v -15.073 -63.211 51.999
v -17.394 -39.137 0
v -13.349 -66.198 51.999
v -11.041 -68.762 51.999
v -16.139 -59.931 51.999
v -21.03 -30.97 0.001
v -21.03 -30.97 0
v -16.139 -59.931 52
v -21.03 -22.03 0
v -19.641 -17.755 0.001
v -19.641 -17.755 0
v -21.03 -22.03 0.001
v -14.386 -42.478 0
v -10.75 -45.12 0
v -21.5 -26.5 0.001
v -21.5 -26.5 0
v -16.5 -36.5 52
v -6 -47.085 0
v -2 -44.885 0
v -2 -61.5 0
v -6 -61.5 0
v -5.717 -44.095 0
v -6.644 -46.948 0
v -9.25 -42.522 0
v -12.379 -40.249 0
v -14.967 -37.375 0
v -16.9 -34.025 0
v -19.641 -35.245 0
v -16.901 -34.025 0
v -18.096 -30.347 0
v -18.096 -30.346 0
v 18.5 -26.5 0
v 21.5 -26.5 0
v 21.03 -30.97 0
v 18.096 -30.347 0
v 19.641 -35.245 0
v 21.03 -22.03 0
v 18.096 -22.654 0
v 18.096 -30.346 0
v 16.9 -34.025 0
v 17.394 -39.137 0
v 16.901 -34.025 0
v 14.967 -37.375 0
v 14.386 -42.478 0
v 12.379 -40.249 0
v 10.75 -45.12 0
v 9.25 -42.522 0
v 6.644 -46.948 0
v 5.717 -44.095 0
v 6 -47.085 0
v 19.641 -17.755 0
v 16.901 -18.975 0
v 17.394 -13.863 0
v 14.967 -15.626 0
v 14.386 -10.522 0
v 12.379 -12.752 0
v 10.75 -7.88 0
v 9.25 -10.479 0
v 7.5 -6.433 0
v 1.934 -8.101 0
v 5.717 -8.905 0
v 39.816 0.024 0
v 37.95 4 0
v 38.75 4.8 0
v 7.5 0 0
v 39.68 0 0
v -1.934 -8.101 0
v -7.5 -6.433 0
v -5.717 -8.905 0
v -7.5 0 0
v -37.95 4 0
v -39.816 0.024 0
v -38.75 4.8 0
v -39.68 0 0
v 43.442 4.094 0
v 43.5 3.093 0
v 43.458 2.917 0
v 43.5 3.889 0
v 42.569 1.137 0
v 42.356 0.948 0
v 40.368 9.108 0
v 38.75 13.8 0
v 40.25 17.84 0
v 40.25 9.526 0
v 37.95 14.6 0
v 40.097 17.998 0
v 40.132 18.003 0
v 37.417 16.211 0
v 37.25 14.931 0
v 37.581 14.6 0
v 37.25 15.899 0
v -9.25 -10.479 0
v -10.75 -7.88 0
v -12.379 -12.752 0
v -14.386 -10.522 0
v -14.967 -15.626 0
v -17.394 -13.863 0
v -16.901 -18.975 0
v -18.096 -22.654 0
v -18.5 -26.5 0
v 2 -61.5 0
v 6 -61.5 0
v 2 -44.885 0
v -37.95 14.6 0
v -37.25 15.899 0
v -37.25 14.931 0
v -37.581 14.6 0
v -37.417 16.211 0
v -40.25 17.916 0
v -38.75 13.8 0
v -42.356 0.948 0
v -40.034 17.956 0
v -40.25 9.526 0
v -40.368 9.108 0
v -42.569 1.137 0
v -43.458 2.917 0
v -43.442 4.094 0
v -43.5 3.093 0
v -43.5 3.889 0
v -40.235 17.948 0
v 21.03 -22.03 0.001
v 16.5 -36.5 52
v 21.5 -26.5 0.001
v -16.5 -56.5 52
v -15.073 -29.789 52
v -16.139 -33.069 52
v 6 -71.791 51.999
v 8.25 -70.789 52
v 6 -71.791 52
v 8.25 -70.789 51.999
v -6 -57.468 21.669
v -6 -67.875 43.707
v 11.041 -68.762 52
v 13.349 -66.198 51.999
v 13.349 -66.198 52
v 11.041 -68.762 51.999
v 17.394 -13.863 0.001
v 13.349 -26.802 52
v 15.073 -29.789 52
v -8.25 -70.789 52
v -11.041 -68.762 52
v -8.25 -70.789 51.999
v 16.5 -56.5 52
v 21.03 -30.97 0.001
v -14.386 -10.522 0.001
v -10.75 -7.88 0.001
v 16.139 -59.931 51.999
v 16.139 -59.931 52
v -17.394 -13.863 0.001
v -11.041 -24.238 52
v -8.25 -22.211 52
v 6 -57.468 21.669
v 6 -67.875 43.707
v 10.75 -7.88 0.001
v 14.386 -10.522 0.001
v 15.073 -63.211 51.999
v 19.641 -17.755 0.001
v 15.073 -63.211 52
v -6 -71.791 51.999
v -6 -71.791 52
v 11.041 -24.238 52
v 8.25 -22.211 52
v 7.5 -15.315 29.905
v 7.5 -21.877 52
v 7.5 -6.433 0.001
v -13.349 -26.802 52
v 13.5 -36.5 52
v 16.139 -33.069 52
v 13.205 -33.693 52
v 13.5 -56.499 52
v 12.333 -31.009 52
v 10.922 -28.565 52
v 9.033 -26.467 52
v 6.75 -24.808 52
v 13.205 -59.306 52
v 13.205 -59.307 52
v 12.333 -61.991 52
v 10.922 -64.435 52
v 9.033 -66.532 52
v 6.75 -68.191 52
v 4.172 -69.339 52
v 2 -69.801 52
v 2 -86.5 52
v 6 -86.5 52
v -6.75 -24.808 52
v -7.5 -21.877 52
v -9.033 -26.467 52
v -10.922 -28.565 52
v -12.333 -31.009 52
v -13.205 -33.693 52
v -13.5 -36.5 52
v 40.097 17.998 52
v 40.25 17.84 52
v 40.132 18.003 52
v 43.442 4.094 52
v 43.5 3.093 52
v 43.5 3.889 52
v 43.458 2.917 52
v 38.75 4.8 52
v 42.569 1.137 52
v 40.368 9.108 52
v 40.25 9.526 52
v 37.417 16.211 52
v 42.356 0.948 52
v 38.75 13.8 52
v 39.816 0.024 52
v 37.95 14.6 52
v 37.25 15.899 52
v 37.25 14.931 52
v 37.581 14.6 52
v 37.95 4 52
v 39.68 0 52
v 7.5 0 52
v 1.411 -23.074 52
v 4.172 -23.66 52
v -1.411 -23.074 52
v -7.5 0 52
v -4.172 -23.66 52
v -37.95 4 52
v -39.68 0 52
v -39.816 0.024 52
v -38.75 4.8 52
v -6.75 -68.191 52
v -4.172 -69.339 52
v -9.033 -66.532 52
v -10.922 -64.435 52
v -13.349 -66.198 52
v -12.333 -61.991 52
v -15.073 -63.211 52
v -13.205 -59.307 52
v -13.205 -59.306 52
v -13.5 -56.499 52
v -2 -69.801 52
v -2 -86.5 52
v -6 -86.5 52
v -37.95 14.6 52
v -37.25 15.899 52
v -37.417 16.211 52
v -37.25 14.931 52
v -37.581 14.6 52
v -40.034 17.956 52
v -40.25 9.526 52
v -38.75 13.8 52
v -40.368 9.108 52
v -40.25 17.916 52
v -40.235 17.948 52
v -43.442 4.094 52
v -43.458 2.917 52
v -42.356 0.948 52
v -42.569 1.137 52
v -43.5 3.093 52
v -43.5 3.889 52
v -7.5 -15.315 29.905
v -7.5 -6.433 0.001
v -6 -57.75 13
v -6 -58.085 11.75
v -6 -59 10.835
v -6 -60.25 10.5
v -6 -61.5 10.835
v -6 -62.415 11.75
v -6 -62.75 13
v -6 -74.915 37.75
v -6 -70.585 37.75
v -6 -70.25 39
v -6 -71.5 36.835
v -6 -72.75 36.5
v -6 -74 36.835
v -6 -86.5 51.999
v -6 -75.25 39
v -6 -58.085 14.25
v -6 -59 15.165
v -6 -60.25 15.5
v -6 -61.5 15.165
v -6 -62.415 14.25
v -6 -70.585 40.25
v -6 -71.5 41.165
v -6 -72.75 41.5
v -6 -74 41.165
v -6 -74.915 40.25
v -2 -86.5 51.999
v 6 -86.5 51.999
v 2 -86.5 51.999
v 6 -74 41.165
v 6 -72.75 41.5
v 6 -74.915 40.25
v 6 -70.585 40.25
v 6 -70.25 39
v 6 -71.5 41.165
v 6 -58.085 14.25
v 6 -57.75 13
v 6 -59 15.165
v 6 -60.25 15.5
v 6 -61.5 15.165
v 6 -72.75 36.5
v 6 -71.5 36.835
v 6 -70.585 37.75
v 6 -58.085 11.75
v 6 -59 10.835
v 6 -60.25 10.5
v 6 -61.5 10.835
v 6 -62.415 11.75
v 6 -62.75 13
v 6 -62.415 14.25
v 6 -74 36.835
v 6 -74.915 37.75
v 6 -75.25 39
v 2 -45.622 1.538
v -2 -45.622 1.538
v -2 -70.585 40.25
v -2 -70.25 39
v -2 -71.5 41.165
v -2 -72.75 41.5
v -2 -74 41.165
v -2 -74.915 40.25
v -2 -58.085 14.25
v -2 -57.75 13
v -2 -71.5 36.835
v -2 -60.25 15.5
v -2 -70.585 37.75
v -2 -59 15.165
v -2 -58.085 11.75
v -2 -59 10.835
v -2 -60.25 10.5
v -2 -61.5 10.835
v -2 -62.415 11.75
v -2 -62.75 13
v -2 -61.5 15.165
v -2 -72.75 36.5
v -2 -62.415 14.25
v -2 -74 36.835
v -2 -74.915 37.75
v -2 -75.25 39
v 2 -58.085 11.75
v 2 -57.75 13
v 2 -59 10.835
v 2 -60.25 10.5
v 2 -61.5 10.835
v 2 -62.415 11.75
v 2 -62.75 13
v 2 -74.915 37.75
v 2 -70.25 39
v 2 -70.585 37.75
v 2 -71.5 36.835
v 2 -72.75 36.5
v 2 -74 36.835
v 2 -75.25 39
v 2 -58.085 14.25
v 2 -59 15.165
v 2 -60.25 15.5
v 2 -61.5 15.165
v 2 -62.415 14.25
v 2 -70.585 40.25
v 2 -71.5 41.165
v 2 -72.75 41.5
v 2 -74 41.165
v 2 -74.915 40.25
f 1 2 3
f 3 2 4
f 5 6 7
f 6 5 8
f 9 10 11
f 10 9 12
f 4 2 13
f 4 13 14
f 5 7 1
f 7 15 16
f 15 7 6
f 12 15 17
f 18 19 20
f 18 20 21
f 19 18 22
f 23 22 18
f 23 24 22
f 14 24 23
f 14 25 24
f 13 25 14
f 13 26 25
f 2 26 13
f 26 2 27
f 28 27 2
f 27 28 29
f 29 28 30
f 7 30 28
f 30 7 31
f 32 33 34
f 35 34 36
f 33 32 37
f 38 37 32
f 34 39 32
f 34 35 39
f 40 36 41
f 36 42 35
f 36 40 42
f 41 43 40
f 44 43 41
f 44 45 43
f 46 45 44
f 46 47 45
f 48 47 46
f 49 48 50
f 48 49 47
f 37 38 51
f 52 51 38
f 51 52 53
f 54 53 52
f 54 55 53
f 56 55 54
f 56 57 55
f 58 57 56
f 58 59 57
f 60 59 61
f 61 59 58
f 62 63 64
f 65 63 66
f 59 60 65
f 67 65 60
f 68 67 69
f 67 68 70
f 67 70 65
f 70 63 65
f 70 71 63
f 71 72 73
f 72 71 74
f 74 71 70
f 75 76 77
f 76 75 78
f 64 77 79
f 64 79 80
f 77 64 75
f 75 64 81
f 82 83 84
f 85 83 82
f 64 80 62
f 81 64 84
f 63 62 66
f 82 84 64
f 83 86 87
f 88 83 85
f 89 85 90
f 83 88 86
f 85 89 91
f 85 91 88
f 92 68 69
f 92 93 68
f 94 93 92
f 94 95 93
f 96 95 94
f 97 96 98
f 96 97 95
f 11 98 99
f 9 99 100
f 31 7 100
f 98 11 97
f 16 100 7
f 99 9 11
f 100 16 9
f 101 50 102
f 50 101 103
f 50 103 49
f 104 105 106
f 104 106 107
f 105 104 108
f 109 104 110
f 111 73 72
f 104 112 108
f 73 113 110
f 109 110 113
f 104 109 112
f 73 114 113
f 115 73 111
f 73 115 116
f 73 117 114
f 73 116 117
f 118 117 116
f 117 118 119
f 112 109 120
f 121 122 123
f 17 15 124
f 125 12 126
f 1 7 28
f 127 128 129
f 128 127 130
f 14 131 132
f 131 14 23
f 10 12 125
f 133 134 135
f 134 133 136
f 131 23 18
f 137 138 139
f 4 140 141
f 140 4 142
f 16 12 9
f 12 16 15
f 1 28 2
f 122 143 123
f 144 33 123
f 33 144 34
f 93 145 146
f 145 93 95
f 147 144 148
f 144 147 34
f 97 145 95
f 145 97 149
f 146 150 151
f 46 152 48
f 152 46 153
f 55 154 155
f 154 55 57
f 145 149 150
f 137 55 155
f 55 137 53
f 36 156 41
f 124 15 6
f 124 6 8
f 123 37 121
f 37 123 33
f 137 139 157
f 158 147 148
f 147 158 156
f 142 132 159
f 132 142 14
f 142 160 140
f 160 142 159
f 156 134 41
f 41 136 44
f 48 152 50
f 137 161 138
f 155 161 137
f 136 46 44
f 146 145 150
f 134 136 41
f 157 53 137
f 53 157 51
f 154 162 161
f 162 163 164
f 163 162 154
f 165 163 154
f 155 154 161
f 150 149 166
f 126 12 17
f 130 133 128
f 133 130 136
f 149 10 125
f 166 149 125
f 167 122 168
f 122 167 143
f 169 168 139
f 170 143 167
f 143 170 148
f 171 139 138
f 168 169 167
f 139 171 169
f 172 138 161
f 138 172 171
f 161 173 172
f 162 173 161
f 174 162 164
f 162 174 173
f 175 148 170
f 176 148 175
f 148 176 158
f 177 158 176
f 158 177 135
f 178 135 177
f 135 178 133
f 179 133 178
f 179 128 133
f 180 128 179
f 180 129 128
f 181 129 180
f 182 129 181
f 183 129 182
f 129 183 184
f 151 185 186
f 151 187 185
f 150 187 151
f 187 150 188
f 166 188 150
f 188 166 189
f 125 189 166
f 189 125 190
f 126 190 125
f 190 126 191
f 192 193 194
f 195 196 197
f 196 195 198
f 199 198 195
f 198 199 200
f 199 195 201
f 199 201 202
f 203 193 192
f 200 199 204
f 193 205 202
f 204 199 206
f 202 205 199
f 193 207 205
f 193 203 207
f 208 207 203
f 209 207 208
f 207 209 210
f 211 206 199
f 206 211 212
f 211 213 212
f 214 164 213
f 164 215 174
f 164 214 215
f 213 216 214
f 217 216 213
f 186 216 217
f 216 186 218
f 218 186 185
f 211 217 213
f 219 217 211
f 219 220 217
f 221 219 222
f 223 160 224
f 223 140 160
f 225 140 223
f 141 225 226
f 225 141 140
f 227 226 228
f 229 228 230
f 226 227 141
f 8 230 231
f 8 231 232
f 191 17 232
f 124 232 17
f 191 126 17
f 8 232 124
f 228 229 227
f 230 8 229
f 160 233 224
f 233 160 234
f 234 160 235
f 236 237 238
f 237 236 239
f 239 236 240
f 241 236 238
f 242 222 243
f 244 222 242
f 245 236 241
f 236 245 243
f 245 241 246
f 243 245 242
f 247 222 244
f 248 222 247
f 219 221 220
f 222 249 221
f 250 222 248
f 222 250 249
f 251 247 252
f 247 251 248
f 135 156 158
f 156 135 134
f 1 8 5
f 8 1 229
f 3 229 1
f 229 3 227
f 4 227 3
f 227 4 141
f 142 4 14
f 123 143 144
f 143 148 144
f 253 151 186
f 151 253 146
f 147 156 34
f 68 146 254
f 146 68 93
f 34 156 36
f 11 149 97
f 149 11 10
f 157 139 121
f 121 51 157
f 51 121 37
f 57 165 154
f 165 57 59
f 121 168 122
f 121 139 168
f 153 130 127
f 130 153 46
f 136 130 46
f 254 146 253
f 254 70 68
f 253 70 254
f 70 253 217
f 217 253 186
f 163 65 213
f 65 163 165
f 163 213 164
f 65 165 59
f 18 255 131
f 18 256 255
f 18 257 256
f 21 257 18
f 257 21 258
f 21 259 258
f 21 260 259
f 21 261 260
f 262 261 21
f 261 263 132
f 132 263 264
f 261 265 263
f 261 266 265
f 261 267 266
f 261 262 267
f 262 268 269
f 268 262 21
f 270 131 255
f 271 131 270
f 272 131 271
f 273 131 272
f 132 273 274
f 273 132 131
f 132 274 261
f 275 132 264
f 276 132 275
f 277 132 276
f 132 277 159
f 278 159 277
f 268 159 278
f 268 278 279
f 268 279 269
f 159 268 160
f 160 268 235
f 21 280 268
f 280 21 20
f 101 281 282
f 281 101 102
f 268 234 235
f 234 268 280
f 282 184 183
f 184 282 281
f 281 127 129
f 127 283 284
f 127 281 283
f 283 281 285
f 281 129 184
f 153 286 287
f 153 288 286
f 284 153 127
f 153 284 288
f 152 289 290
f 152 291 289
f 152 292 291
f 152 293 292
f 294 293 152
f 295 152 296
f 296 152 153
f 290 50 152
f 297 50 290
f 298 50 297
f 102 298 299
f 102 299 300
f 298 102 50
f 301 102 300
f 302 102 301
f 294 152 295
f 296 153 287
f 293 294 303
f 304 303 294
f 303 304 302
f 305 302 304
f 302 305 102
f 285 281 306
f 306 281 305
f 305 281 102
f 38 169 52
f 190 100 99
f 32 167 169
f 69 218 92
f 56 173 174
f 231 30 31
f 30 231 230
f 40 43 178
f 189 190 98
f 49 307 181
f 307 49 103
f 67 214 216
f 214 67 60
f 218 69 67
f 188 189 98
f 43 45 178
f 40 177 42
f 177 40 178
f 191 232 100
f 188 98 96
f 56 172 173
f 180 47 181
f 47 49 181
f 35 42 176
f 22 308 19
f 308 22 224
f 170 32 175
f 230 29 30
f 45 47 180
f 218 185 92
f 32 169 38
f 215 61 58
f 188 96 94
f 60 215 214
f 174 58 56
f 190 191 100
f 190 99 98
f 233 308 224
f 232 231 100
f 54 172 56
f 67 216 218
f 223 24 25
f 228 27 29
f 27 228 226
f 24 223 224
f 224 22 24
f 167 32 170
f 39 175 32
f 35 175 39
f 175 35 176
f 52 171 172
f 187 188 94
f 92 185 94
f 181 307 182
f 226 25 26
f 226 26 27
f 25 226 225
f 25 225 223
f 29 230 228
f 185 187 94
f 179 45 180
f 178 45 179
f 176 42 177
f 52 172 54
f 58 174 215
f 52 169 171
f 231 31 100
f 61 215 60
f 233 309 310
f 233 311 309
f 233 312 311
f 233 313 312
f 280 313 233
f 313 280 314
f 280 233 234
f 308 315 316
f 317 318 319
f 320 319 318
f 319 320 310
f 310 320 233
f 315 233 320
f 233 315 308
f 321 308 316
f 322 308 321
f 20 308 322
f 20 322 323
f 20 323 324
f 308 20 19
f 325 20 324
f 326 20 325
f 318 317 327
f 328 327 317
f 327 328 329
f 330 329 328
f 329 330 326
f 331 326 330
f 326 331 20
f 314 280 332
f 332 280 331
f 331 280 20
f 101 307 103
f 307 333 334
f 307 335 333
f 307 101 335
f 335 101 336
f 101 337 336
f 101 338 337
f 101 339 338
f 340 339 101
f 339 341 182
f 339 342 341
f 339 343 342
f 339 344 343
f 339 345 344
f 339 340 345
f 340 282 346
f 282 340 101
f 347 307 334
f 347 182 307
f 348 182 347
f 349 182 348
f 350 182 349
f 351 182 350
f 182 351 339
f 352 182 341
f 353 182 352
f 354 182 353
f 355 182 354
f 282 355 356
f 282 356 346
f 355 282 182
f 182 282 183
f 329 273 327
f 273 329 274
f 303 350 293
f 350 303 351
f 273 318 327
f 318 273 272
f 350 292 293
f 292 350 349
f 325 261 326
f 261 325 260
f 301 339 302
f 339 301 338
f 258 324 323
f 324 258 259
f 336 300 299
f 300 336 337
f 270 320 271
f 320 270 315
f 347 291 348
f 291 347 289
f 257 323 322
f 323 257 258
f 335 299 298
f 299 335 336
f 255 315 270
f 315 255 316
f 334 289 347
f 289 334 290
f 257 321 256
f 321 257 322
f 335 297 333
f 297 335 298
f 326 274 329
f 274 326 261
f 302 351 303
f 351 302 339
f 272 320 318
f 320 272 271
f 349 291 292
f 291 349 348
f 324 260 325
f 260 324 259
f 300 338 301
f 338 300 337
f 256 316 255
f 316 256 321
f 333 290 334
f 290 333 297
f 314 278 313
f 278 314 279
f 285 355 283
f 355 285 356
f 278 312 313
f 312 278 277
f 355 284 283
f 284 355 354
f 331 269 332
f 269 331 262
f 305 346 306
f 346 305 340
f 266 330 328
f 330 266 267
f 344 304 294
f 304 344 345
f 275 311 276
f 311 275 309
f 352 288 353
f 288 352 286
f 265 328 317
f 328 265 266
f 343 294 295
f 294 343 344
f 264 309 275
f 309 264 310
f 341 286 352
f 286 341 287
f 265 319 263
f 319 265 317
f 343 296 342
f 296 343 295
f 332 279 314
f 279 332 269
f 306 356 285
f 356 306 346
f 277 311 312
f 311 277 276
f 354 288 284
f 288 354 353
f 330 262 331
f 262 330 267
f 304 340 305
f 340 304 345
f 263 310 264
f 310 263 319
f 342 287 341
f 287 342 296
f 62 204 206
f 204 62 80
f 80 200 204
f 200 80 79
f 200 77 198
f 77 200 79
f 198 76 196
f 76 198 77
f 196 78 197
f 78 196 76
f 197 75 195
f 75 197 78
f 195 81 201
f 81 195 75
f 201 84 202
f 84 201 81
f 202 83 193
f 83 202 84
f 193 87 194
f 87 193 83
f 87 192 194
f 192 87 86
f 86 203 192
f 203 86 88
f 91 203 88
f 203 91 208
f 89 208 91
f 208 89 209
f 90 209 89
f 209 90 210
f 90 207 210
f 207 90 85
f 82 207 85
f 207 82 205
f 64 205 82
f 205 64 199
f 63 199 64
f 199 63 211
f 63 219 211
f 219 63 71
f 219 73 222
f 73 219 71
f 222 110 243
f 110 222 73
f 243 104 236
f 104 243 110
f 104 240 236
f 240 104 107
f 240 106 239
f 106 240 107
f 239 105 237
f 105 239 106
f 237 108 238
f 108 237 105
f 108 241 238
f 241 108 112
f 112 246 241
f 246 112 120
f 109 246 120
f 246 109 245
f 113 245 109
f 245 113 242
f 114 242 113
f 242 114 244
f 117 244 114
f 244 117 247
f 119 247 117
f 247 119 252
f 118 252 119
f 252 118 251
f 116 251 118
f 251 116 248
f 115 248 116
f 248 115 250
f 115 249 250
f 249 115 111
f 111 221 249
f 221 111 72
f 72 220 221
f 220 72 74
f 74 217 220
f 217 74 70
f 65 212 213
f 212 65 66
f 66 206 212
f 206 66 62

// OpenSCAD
// file: paths.scad
function sumTo(v,n) = n<=0 ? 0 : v[n-1]+sumTo(v,n-1);
function sum(v) = sumTo(v,len(v));
function interpolationData(v) = let(
    n=len(v)-1,
    d=[for (i=[0:n-1]) norm(v[i]-v[i+1])],
    sumD=[for (i=[0:n]) sumTo(d,i)],
    totalD=sumD[n]) 
        [d,sumD,v,totalD];
function totalLength(interp) = interp[3];
function interpolatePoints(a,b,t) = (1-t)*a+(t)*b;
function findSegmentByDistance(sumD,distance) = let(
    found = [for(i=[0:len(sumD)-1]) if(sumD[i]<=distance && distance<sumD[i+1]) i])
        len(found)>0 ? found[0] : -1;
function interpolateByDistance(interp,distance) = let(
    n=len(interp[1])-1,
    d=interp[0],
    sumD=interp[1],
    v=interp[2],
    totalD=interp[3],
    i=findSegmentByDistance(sumD,distance))
        i<0 ? (distance<totalD/2 ? v[0] : v[n]) :
            interpolatePoints(v[i],v[i+1],(distance-sumD[i])/d[i]);
function get2DNormalBetweenPoints(a,b) = let(
    v = (b-a)/norm(b-a))
        [v[1],-v[0]];
function getTangentByDistance(interp,distance) = let(
    n=len(interp[1])-1,
    d=interp[0],
    sumD=interp[1],
    v=interp[2],
    totalD=interp[3],
    i0=findSegmentByDistance(sumD,distance),
    i = i0 < 0 ? (distance<totalD/2 ? 0 : n-1) : i0)
        (v[i+1]-v[i])/norm(v[i+1]-v[i]);
    
function interpolateByParameter(interp,t) = interpolateByDistance(interp,t*totalLength(interp));
function singleInterpolateByDistance(v,distance) = interpolateByDistance(interpolationData(v),distance);
function singleInterpolateByParameter(v,t) = interpolateByParameter(interpolationData(v),t);
function measurePath(v) = totalLength(interpolationData(v));

function findCoordinateIntersection2(a,b,index,value) = 
    a[index] == value ? a : 
        b[index] == value ? b :
            let( t=(value-a[index]) / (b[index]-a[index]))
                (1-t)*a+t*b;

function findCoordinateIntersections(path,index,value) = 
    [for (i=[0:len(path)-2]) if ((path[i][index]-value)*(path[i+1][index]-value) <= 0) findCoordinateIntersection2(path[i],path[i+1],index,value)];            

function mirrorMatrix(normalVector) = let(v = normalVector/norm(normalVector)) len(v)<3 ? [[1-2*v[0]*v[0],-2*v[0]*v[1]],[-2*v[0]*v[1],1-2*v[1]*v[1]]] : [[1-2*v[0]*v[0],-2*v[0]*v[1],-2*v[0]*v[2]],[-2*v[0]*v[1],1-2*v[1]*v[1],-2*v[1]*v[2]],[-2*v[0]*v[2],-2*v[1]*v[2],1-2*v[2]*v[2]]];

function trimArray(a, n) = [for (i=[0:n-1]) a[i]];

function transformPoint(matrix,a) = 
    let(n=len(a))
        len(matrix[0])==n+1 ? 
            trimArray(matrix * concat(a,[1]), n)
            : matrix * a;

function transformPath(matrix,path) =
    [for (a=path) transformPoint(matrix,a)];

function reverseArray(array) = let(n=len(array)) [for (i=[0:n-1]) array[n-1-i]];

function stitchPaths(a,b) = let(na=len(a)) [for (i=[0:na+len(b)-2]) i<na? a[i] : b[i-na+1]-b[0]+a[na-1]];

//interp = interpolationData([[1,2],[2,3],[1,2]]);
//echo(singleInterpolateByParameter([[1,1],[2,2],[3,1]],0.75));
//echo(measurePath([[1,2],[2,3],[1,2]]));
// main file
use <paths.scad>;

//<params>
phoneWidth = 77.5;
snapHeight = 10.6;
thickness = 4;
holderWidth = 52;

tubeDiameterBottom = 35;
tubeDiameterTop = 25;
tubeGrabberStalkThickness = 15;
tubeGrabberStalkLengthBottom = 5;
tubeGrabberStalkLengthTop = 20;
tubeGrabberWall = 3;
tubeGrabberScrewAreaWall = 4;
tubeGrabberScrewAreaWidth = 15;
tubeExtraDepthBottom = 0;
tubeExtraDepthTop = 20;
tubeTolerance = 1;
cinch = 4;

screwPosition1 = 0.25;
screwPosition2 = 0.75;
screwHoleDiameter = 5;

delta1 = 1;
delta2 = 3.75;
delta3 = 4.75;
bumpHeight = 3;
snapInset = 1.5;
snapThickness = 1.5;
rounding = 0.8;
//</params>

module dummy() {}

extraThickness = thickness - bumpHeight;
b1 = phoneWidth + 2*delta1;
b1a = phoneWidth + 2*delta2;
b2 = phoneWidth + 2*delta3;
h1a = bumpHeight / 3;

nudge = 0.001;

rightPath = 
  [ [b1/2,0],
    [b1a/2,h1a],
    [b2/2,bumpHeight],
    [b2/2,bumpHeight+extraThickness],
    [phoneWidth/2+snapThickness,bumpHeight+extraThickness+snapHeight*0.5],
    [phoneWidth/2+snapThickness,bumpHeight+extraThickness+snapHeight+snapThickness+2],
    [phoneWidth/2-snapInset,bumpHeight+extraThickness+snapHeight+snapThickness],
    [phoneWidth/2-snapInset,bumpHeight+extraThickness+snapHeight],
    [phoneWidth/2,bumpHeight+extraThickness+snapHeight],
    [phoneWidth/2,bumpHeight+extraThickness],
    [0, bumpHeight+extraThickness]];
    
    
path = stitchPaths(rightPath,reverseArray(transformPath(mirrorMatrix([1,0]),rightPath)));

module mainHolder() {
    linear_extrude(height=holderWidth) 
offset(r=-rounding) offset(r=rounding) polygon(points=path);
}

module tube(outset=0) {
    nudgez = outset==0 ? nudge : 0;
    hull() {
        for (dy=[0,-tubeExtraDepthBottom]) 
        translate([0,-tubeGrabberStalkLengthBottom-tubeGrabberWall-tubeTolerance-tubeDiameterBottom/2+dy,-nudgez])
        cylinder(d=tubeDiameterBottom+2*tubeTolerance+2*outset,h=nudge);
        for (dy=[0,-tubeExtraDepthTop]) 
        translate([0,-tubeGrabberStalkLengthTop-tubeGrabberWall-tubeTolerance-tubeDiameterTop/2+dy,holderWidth-nudge+nudgez])
        cylinder(d=tubeDiameterTop+2*tubeTolerance+2*outset,h=nudge);        
    }
    if(outset>0) {
        hull() for (dydz=[[tubeGrabberStalkLengthBottom,0,tubeDiameterBottom],[tubeGrabberStalkLengthTop,holderWidth-nudge,tubeDiameterTop]]) {
            {
                dy = dydz[0];
                dz = dydz[1];
                tubeDiameter = dydz[2];
                translate([-tubeGrabberStalkThickness/2,-dy-tubeDiameter/2-nudge,dz])
              cube([tubeGrabberStalkThickness,dy+tubeDiameter/2+2*nudge,nudge]);
            }
        }
}   


    w = outset>0 ? (tubeGrabberScrewAreaWall*2+cinch) : cinch;
    nudgey = outset>0 ? 0 : nudge;
        hull() for (dydz=[[tubeGrabberStalkLengthBottom+tubeExtraDepthBottom+nudgey,-nudgez,tubeDiameterBottom],[tubeGrabberStalkLengthTop+tubeExtraDepthTop+nudgey,holderWidth-nudge+nudgez,tubeDiameterTop]]) {
            dy = dydz[0];
            dz = dydz[1];
            tubeDiameter = dydz[2];
            translate([-w/2,-tubeGrabberScrewAreaWidth-dy-tubeDiameter-tubeTolerance/2-tubeGrabberWall*2,dz]) cube([w,tubeGrabberScrewAreaWidth+tubeDiameter/2,nudge]);
        }

}

module screwStuff() {
    syBottom = -tubeGrabberStalkLengthBottom-tubeExtraDepthBottom-tubeGrabberScrewAreaWidth/2-tubeDiameterBottom-tubeTolerance/2-tubeGrabberWall*2;
    syTop = -tubeGrabberStalkLengthTop-tubeExtraDepthTop-tubeGrabberScrewAreaWidth/2-tubeDiameterTop-tubeTolerance/2-tubeGrabberWall*2;
    sy1 = syBottom * (1-screwPosition1) + syTop * screwPosition1;
    sy2 = syBottom * (1-screwPosition2) + syTop * screwPosition2;
    sz1 = screwPosition1 * holderWidth;
    sz2 = screwPosition2 * holderWidth;
    for (pos=[[sy1,sz1],[sy2,sz2]]) 
        translate([0,pos[0],pos[1]]) rotate([0,90,0])
    cylinder(d=screwHoleDiameter,h=tubeGrabberScrewAreaWall*2+cinch+2*nudge,center=true,$fn=12);
}

mainHolder();
difference() {
    tube(outset=tubeGrabberWall);
    tube(outset=0);
    screwStuff();
}
